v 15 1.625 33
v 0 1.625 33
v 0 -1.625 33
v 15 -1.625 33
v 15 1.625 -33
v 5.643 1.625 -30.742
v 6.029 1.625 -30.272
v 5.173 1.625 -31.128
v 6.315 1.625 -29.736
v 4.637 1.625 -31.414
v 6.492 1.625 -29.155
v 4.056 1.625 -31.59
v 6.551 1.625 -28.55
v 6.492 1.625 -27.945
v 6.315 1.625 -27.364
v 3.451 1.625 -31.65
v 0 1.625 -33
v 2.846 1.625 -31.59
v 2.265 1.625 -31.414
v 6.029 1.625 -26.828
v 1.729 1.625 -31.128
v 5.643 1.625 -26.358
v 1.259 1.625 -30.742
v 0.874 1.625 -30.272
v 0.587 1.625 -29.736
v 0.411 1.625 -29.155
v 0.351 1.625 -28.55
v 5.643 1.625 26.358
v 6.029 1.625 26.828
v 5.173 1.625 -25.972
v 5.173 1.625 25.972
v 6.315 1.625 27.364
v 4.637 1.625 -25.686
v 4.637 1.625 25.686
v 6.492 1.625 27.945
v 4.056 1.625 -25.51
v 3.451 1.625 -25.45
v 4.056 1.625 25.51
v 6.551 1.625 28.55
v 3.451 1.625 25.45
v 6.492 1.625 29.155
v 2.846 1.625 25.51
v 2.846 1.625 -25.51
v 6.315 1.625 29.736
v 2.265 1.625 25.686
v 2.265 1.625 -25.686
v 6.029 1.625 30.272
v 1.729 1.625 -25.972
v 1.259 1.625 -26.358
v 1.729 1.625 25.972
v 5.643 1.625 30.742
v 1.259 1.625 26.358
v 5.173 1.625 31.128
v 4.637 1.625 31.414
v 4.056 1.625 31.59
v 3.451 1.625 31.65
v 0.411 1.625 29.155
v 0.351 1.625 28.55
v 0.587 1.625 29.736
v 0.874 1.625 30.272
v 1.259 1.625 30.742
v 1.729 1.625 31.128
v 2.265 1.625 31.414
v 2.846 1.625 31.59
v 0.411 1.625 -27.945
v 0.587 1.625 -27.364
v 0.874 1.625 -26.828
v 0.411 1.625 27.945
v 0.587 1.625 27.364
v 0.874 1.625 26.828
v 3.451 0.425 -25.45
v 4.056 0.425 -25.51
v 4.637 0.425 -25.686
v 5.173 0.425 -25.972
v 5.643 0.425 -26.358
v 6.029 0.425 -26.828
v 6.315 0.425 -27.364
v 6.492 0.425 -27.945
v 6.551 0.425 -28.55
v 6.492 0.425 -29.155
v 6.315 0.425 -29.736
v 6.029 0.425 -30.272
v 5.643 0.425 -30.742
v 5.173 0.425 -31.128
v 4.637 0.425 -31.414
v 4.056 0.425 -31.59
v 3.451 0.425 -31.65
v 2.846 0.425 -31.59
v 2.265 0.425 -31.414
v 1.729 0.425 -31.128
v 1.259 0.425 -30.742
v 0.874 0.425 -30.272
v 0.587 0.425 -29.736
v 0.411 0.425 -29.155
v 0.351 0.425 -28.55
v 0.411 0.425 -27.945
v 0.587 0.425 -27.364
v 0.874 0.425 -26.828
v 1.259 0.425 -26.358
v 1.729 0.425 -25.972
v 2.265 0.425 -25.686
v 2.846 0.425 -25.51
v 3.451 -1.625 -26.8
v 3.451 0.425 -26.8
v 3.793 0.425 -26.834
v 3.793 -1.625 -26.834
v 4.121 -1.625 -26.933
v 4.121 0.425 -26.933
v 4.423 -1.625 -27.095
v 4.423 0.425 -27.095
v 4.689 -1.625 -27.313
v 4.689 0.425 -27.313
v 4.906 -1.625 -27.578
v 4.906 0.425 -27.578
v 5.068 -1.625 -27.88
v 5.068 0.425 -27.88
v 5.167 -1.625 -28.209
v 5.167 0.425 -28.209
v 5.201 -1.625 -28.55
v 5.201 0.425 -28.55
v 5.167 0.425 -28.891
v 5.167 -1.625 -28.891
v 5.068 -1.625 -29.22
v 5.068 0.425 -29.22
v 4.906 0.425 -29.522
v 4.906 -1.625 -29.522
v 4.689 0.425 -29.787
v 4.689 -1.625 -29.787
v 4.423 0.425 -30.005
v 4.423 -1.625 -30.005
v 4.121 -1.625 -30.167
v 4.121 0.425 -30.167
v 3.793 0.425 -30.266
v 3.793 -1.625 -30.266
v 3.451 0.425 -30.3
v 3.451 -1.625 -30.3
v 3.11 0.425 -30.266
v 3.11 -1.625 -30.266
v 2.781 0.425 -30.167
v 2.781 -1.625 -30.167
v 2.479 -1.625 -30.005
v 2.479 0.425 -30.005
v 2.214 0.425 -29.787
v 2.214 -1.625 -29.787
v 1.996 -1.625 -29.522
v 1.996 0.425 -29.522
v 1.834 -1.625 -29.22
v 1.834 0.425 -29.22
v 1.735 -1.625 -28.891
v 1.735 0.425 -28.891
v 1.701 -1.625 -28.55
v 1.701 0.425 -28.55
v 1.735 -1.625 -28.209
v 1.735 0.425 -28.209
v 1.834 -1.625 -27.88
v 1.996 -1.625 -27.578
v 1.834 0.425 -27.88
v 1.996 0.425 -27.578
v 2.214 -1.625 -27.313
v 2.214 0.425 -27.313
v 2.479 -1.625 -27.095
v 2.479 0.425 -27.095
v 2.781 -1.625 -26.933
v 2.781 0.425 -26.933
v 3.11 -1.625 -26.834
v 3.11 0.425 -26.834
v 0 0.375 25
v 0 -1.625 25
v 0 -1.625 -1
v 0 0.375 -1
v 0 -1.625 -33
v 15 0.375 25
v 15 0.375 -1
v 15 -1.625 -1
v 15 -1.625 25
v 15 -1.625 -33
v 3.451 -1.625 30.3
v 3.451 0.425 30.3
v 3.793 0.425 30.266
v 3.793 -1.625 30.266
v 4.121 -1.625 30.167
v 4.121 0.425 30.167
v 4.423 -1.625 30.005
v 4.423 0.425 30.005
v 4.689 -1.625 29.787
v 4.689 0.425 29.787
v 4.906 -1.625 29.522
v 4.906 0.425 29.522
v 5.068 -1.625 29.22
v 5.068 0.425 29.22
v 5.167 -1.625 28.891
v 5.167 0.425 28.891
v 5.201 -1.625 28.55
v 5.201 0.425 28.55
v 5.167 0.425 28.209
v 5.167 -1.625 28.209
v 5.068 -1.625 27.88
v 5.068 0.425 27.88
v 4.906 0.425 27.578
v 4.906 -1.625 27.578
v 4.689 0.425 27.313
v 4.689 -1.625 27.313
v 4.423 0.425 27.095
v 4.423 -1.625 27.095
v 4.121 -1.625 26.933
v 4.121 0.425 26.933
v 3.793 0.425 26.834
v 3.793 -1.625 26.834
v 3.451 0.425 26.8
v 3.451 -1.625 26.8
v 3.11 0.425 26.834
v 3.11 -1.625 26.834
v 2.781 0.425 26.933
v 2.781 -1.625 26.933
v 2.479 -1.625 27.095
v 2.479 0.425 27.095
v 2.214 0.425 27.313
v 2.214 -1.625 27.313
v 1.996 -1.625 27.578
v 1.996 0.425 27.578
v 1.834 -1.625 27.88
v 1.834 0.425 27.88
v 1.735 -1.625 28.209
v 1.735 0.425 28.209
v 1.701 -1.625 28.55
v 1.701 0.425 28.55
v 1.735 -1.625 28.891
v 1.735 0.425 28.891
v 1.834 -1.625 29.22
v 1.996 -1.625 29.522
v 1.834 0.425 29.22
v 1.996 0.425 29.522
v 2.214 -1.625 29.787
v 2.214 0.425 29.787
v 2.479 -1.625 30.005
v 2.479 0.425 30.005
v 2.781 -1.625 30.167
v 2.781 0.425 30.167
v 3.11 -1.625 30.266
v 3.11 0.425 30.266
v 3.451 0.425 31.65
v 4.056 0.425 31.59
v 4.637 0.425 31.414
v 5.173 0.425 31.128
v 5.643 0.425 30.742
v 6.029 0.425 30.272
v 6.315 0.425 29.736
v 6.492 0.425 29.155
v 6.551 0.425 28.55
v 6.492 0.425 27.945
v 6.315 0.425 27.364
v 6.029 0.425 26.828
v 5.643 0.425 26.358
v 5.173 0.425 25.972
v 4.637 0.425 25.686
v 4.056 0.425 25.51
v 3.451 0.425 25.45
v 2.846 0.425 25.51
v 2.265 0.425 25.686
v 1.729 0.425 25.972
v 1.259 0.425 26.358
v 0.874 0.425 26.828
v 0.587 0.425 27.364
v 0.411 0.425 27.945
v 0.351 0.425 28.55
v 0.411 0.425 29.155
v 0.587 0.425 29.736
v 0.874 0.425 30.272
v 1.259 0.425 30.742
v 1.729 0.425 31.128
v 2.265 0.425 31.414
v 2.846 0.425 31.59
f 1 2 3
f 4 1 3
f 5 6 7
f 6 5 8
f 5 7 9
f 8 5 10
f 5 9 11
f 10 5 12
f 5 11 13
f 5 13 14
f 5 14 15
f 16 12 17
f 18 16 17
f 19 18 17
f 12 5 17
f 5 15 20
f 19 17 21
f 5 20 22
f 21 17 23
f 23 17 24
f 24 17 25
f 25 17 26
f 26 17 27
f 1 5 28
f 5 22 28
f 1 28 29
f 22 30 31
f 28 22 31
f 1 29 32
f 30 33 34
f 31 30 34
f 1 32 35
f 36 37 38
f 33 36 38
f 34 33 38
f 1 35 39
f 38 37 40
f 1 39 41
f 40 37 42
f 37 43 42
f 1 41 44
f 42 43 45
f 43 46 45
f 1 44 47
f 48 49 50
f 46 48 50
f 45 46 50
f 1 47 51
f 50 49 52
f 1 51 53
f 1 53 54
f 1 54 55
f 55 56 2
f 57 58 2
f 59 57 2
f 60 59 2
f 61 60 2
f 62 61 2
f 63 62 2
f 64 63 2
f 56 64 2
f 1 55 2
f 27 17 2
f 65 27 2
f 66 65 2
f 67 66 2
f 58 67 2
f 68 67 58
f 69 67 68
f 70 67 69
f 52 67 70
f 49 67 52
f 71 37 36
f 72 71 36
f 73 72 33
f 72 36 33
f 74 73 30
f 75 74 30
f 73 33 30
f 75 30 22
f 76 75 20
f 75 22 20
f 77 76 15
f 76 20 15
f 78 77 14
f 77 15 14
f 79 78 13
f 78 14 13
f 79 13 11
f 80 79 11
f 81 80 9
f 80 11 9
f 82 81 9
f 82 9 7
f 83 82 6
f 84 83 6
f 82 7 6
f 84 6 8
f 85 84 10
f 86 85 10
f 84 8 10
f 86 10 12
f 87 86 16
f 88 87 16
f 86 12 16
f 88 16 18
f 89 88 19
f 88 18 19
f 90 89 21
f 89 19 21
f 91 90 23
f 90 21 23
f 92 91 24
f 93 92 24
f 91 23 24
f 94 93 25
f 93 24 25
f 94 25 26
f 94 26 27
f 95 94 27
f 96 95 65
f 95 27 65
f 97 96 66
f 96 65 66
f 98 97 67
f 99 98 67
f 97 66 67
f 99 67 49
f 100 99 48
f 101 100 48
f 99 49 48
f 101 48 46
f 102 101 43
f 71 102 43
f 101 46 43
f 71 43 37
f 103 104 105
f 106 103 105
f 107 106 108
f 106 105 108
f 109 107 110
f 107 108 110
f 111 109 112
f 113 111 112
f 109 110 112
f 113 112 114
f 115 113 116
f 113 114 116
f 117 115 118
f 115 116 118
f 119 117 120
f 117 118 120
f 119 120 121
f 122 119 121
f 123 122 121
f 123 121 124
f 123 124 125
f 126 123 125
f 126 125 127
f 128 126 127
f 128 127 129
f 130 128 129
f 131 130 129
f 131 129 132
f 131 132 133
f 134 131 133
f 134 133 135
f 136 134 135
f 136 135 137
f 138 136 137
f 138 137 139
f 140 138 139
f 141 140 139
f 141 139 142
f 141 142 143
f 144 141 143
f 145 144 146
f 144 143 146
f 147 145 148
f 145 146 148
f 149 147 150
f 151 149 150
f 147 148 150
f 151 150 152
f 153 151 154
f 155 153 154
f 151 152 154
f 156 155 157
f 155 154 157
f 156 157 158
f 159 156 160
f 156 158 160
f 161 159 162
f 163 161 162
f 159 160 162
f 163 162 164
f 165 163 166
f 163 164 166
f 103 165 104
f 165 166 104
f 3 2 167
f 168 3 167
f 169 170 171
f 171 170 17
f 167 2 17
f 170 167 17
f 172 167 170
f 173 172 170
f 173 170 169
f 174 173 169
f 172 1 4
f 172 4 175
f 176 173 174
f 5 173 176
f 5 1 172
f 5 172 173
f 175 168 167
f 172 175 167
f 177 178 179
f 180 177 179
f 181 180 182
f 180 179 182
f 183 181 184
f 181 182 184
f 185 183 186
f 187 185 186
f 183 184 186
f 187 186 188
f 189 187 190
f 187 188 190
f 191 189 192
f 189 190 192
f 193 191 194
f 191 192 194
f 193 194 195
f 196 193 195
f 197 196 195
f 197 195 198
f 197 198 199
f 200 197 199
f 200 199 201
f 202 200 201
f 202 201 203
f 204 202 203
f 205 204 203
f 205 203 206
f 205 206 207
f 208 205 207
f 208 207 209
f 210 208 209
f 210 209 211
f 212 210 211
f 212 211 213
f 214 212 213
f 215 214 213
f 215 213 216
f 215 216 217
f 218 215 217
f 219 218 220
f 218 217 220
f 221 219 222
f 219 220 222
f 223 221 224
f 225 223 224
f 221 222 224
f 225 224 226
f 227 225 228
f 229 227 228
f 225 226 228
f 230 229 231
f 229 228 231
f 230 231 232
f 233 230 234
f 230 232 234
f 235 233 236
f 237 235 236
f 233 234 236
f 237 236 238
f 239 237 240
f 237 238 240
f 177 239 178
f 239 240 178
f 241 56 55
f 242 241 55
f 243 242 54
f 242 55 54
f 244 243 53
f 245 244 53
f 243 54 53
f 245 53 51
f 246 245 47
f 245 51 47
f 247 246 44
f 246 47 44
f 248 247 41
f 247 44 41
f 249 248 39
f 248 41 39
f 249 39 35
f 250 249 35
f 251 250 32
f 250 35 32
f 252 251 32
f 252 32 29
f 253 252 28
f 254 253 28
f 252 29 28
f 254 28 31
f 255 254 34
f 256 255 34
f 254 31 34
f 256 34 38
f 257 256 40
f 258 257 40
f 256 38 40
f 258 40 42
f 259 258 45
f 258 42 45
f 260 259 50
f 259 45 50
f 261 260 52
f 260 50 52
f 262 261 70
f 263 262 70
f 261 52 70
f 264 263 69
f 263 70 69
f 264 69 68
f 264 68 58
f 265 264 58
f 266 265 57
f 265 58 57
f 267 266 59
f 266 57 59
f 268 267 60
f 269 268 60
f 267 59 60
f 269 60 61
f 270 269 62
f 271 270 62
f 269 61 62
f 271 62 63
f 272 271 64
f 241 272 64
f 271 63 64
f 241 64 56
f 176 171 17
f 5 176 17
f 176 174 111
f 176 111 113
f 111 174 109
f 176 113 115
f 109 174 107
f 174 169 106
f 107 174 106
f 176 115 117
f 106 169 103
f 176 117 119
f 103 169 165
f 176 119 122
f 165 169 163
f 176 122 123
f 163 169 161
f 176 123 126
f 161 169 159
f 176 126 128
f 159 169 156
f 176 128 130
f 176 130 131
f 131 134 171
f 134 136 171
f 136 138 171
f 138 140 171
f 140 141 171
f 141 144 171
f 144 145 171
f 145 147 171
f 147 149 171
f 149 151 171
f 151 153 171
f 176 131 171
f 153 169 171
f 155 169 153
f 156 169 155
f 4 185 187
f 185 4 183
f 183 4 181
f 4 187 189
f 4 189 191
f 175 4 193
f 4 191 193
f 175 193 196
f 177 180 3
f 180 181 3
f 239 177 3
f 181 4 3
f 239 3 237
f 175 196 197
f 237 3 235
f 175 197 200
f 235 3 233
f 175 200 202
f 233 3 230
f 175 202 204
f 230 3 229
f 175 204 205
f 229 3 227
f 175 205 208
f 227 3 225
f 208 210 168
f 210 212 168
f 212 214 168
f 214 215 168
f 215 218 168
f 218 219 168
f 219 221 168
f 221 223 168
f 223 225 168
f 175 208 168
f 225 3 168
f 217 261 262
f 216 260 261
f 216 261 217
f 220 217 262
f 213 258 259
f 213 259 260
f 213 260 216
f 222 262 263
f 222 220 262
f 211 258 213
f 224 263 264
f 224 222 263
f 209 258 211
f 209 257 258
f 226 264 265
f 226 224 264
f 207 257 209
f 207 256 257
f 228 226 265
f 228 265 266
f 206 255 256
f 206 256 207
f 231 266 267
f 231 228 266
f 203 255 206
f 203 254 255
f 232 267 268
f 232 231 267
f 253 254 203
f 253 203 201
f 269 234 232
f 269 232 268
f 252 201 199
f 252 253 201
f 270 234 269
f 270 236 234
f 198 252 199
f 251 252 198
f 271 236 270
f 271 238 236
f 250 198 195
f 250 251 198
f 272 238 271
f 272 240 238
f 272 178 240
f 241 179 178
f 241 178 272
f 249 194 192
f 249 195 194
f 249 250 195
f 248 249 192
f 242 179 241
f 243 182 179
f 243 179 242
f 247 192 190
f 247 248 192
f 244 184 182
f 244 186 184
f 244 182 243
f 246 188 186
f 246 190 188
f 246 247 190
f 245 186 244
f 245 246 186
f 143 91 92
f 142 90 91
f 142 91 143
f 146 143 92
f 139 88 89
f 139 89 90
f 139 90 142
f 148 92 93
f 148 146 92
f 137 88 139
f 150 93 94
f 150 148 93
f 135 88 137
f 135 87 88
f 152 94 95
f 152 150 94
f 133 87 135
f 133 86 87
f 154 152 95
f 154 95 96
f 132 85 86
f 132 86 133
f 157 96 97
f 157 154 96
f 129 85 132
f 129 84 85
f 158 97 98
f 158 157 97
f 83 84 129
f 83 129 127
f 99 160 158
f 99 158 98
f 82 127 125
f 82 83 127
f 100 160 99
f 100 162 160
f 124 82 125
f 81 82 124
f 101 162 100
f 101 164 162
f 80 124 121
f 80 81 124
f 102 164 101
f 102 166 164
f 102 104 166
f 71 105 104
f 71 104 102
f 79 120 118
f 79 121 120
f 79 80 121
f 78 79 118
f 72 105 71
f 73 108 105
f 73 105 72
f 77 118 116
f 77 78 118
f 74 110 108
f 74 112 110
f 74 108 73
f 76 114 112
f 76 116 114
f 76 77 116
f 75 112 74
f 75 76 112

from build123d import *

# Parameters (mm, degrees)
EXTRUDE_1_DEPTH     = 15
SKETCH_2_R          = 1.75
CUT_EXTRUDE_1_DEPTH = 37.394539426
SKETCH_2_3_R        = 3.1
SKETCH_2_3_R_2      = 1.75
CUT_EXTRUDE_2_DEPTH = 1.2


with BuildPart() as part:
    # 草图1 → 凸台-拉伸1 (new body)
    with BuildSketch(Plane(origin=(0, 0, 0), x_dir=(0, 0, -1), z_dir=(1, 0, 0))):
        Polygon((33, 1.625), (-33, 1.625), (-33, -1.625), (-25, -1.625), (-25, 0.375), (1, 0.375), (1, -1.625), (33, -1.625), align=None)
    extrude(amount=EXTRUDE_1_DEPTH)

    # 草图2 → 切除-拉伸1 (cut, through all)
    with BuildSketch(Plane(origin=(0, 1.625, 0), x_dir=(1, 0, 0), z_dir=(0, 1, 0))):
        with Locations((3.451122219, 28.55)):
            Circle(SKETCH_2_R)
        with Locations((3.451122219, -28.55)):
            Circle(SKETCH_2_R)
    extrude(amount=-CUT_EXTRUDE_1_DEPTH, mode=Mode.SUBTRACT)

    # 草图2<3> → 切除-拉伸2 (cut)
    # profile 1 of 2: a face of its own
    with BuildSketch(Plane(origin=(0, 1.625, 0), x_dir=(1, 0, 0), z_dir=(0, 1, 0))):
        with Locations((3.451122219, 28.55)):
            Circle(SKETCH_2_3_R)
        with Locations((3.451122219, 28.55)):
            Circle(SKETCH_2_3_R_2, mode=Mode.SUBTRACT)
    # profile 2 of 2: a face of its own
    with BuildSketch(Plane(origin=(0, 1.625, 0), x_dir=(1, 0, 0), z_dir=(0, 1, 0))):
        with Locations((3.451122219, -28.55)):
            Circle(SKETCH_2_3_R)
        with Locations((3.451122219, -28.55)):
            Circle(SKETCH_2_3_R_2, mode=Mode.SUBTRACT)
    extrude(amount=-CUT_EXTRUDE_2_DEPTH, mode=Mode.SUBTRACT)


solid = part.part
